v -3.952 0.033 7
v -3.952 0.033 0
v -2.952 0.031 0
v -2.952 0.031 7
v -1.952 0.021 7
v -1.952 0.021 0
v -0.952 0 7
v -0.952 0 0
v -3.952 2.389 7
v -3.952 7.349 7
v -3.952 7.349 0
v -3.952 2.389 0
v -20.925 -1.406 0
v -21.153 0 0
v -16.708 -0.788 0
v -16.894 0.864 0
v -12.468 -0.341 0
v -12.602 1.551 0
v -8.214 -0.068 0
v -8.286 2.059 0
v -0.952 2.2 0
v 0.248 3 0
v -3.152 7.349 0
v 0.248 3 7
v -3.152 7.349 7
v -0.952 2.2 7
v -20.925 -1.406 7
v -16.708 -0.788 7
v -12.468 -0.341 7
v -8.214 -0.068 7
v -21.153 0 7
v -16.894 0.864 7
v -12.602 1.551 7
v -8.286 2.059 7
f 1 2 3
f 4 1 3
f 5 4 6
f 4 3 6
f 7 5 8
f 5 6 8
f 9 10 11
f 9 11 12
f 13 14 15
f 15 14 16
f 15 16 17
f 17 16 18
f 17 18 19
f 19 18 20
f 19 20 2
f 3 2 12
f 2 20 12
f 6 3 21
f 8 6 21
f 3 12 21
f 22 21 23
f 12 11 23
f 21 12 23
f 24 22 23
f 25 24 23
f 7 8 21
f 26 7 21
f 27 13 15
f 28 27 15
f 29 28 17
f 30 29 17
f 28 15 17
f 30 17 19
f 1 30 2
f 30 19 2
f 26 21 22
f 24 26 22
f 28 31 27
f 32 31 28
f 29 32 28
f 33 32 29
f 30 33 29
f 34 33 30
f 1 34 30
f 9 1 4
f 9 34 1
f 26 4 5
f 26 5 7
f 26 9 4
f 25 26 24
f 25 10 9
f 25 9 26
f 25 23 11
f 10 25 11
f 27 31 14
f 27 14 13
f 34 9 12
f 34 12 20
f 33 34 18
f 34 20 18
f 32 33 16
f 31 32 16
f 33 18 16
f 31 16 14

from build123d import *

# Parameters (mm, degrees)
F1_DEPTH = 7


with BuildPart() as f1:
    # F0 (on Top) → F1 (new body)
    with BuildSketch(Plane.XY):
        with BuildLine():
            ThreePointArc((-3.952456, 0.032943), (-2.452339, 0.027193), (-0.952456, 0))
            Line((-0.952456, 0), (-0.952456, 2.2))
            Line((-0.952456, 2.2), (0.247544, 3))
            Line((0.247544, 3), (-3.152456, 7.348705))
            Line((-3.152456, 7.348705), (-3.952456, 7.348705))
            Line((-3.952456, 7.348705), (-3.952456, 2.5))
            Line((-3.952456, 2.5), (-3.952456, 2.388958))
            ThreePointArc((-3.952456, 2.388958), (-12.602156, 1.550858), (-21.152861, 0))
            Line((-21.152861, 0), (-20.925339, -1.405665))
            ThreePointArc((-20.925339, -1.405665), (-12.468133, -0.341437), (-3.952456, 0.032943))
        make_face()
    extrude(amount=F1_DEPTH)


solid = f1.part
